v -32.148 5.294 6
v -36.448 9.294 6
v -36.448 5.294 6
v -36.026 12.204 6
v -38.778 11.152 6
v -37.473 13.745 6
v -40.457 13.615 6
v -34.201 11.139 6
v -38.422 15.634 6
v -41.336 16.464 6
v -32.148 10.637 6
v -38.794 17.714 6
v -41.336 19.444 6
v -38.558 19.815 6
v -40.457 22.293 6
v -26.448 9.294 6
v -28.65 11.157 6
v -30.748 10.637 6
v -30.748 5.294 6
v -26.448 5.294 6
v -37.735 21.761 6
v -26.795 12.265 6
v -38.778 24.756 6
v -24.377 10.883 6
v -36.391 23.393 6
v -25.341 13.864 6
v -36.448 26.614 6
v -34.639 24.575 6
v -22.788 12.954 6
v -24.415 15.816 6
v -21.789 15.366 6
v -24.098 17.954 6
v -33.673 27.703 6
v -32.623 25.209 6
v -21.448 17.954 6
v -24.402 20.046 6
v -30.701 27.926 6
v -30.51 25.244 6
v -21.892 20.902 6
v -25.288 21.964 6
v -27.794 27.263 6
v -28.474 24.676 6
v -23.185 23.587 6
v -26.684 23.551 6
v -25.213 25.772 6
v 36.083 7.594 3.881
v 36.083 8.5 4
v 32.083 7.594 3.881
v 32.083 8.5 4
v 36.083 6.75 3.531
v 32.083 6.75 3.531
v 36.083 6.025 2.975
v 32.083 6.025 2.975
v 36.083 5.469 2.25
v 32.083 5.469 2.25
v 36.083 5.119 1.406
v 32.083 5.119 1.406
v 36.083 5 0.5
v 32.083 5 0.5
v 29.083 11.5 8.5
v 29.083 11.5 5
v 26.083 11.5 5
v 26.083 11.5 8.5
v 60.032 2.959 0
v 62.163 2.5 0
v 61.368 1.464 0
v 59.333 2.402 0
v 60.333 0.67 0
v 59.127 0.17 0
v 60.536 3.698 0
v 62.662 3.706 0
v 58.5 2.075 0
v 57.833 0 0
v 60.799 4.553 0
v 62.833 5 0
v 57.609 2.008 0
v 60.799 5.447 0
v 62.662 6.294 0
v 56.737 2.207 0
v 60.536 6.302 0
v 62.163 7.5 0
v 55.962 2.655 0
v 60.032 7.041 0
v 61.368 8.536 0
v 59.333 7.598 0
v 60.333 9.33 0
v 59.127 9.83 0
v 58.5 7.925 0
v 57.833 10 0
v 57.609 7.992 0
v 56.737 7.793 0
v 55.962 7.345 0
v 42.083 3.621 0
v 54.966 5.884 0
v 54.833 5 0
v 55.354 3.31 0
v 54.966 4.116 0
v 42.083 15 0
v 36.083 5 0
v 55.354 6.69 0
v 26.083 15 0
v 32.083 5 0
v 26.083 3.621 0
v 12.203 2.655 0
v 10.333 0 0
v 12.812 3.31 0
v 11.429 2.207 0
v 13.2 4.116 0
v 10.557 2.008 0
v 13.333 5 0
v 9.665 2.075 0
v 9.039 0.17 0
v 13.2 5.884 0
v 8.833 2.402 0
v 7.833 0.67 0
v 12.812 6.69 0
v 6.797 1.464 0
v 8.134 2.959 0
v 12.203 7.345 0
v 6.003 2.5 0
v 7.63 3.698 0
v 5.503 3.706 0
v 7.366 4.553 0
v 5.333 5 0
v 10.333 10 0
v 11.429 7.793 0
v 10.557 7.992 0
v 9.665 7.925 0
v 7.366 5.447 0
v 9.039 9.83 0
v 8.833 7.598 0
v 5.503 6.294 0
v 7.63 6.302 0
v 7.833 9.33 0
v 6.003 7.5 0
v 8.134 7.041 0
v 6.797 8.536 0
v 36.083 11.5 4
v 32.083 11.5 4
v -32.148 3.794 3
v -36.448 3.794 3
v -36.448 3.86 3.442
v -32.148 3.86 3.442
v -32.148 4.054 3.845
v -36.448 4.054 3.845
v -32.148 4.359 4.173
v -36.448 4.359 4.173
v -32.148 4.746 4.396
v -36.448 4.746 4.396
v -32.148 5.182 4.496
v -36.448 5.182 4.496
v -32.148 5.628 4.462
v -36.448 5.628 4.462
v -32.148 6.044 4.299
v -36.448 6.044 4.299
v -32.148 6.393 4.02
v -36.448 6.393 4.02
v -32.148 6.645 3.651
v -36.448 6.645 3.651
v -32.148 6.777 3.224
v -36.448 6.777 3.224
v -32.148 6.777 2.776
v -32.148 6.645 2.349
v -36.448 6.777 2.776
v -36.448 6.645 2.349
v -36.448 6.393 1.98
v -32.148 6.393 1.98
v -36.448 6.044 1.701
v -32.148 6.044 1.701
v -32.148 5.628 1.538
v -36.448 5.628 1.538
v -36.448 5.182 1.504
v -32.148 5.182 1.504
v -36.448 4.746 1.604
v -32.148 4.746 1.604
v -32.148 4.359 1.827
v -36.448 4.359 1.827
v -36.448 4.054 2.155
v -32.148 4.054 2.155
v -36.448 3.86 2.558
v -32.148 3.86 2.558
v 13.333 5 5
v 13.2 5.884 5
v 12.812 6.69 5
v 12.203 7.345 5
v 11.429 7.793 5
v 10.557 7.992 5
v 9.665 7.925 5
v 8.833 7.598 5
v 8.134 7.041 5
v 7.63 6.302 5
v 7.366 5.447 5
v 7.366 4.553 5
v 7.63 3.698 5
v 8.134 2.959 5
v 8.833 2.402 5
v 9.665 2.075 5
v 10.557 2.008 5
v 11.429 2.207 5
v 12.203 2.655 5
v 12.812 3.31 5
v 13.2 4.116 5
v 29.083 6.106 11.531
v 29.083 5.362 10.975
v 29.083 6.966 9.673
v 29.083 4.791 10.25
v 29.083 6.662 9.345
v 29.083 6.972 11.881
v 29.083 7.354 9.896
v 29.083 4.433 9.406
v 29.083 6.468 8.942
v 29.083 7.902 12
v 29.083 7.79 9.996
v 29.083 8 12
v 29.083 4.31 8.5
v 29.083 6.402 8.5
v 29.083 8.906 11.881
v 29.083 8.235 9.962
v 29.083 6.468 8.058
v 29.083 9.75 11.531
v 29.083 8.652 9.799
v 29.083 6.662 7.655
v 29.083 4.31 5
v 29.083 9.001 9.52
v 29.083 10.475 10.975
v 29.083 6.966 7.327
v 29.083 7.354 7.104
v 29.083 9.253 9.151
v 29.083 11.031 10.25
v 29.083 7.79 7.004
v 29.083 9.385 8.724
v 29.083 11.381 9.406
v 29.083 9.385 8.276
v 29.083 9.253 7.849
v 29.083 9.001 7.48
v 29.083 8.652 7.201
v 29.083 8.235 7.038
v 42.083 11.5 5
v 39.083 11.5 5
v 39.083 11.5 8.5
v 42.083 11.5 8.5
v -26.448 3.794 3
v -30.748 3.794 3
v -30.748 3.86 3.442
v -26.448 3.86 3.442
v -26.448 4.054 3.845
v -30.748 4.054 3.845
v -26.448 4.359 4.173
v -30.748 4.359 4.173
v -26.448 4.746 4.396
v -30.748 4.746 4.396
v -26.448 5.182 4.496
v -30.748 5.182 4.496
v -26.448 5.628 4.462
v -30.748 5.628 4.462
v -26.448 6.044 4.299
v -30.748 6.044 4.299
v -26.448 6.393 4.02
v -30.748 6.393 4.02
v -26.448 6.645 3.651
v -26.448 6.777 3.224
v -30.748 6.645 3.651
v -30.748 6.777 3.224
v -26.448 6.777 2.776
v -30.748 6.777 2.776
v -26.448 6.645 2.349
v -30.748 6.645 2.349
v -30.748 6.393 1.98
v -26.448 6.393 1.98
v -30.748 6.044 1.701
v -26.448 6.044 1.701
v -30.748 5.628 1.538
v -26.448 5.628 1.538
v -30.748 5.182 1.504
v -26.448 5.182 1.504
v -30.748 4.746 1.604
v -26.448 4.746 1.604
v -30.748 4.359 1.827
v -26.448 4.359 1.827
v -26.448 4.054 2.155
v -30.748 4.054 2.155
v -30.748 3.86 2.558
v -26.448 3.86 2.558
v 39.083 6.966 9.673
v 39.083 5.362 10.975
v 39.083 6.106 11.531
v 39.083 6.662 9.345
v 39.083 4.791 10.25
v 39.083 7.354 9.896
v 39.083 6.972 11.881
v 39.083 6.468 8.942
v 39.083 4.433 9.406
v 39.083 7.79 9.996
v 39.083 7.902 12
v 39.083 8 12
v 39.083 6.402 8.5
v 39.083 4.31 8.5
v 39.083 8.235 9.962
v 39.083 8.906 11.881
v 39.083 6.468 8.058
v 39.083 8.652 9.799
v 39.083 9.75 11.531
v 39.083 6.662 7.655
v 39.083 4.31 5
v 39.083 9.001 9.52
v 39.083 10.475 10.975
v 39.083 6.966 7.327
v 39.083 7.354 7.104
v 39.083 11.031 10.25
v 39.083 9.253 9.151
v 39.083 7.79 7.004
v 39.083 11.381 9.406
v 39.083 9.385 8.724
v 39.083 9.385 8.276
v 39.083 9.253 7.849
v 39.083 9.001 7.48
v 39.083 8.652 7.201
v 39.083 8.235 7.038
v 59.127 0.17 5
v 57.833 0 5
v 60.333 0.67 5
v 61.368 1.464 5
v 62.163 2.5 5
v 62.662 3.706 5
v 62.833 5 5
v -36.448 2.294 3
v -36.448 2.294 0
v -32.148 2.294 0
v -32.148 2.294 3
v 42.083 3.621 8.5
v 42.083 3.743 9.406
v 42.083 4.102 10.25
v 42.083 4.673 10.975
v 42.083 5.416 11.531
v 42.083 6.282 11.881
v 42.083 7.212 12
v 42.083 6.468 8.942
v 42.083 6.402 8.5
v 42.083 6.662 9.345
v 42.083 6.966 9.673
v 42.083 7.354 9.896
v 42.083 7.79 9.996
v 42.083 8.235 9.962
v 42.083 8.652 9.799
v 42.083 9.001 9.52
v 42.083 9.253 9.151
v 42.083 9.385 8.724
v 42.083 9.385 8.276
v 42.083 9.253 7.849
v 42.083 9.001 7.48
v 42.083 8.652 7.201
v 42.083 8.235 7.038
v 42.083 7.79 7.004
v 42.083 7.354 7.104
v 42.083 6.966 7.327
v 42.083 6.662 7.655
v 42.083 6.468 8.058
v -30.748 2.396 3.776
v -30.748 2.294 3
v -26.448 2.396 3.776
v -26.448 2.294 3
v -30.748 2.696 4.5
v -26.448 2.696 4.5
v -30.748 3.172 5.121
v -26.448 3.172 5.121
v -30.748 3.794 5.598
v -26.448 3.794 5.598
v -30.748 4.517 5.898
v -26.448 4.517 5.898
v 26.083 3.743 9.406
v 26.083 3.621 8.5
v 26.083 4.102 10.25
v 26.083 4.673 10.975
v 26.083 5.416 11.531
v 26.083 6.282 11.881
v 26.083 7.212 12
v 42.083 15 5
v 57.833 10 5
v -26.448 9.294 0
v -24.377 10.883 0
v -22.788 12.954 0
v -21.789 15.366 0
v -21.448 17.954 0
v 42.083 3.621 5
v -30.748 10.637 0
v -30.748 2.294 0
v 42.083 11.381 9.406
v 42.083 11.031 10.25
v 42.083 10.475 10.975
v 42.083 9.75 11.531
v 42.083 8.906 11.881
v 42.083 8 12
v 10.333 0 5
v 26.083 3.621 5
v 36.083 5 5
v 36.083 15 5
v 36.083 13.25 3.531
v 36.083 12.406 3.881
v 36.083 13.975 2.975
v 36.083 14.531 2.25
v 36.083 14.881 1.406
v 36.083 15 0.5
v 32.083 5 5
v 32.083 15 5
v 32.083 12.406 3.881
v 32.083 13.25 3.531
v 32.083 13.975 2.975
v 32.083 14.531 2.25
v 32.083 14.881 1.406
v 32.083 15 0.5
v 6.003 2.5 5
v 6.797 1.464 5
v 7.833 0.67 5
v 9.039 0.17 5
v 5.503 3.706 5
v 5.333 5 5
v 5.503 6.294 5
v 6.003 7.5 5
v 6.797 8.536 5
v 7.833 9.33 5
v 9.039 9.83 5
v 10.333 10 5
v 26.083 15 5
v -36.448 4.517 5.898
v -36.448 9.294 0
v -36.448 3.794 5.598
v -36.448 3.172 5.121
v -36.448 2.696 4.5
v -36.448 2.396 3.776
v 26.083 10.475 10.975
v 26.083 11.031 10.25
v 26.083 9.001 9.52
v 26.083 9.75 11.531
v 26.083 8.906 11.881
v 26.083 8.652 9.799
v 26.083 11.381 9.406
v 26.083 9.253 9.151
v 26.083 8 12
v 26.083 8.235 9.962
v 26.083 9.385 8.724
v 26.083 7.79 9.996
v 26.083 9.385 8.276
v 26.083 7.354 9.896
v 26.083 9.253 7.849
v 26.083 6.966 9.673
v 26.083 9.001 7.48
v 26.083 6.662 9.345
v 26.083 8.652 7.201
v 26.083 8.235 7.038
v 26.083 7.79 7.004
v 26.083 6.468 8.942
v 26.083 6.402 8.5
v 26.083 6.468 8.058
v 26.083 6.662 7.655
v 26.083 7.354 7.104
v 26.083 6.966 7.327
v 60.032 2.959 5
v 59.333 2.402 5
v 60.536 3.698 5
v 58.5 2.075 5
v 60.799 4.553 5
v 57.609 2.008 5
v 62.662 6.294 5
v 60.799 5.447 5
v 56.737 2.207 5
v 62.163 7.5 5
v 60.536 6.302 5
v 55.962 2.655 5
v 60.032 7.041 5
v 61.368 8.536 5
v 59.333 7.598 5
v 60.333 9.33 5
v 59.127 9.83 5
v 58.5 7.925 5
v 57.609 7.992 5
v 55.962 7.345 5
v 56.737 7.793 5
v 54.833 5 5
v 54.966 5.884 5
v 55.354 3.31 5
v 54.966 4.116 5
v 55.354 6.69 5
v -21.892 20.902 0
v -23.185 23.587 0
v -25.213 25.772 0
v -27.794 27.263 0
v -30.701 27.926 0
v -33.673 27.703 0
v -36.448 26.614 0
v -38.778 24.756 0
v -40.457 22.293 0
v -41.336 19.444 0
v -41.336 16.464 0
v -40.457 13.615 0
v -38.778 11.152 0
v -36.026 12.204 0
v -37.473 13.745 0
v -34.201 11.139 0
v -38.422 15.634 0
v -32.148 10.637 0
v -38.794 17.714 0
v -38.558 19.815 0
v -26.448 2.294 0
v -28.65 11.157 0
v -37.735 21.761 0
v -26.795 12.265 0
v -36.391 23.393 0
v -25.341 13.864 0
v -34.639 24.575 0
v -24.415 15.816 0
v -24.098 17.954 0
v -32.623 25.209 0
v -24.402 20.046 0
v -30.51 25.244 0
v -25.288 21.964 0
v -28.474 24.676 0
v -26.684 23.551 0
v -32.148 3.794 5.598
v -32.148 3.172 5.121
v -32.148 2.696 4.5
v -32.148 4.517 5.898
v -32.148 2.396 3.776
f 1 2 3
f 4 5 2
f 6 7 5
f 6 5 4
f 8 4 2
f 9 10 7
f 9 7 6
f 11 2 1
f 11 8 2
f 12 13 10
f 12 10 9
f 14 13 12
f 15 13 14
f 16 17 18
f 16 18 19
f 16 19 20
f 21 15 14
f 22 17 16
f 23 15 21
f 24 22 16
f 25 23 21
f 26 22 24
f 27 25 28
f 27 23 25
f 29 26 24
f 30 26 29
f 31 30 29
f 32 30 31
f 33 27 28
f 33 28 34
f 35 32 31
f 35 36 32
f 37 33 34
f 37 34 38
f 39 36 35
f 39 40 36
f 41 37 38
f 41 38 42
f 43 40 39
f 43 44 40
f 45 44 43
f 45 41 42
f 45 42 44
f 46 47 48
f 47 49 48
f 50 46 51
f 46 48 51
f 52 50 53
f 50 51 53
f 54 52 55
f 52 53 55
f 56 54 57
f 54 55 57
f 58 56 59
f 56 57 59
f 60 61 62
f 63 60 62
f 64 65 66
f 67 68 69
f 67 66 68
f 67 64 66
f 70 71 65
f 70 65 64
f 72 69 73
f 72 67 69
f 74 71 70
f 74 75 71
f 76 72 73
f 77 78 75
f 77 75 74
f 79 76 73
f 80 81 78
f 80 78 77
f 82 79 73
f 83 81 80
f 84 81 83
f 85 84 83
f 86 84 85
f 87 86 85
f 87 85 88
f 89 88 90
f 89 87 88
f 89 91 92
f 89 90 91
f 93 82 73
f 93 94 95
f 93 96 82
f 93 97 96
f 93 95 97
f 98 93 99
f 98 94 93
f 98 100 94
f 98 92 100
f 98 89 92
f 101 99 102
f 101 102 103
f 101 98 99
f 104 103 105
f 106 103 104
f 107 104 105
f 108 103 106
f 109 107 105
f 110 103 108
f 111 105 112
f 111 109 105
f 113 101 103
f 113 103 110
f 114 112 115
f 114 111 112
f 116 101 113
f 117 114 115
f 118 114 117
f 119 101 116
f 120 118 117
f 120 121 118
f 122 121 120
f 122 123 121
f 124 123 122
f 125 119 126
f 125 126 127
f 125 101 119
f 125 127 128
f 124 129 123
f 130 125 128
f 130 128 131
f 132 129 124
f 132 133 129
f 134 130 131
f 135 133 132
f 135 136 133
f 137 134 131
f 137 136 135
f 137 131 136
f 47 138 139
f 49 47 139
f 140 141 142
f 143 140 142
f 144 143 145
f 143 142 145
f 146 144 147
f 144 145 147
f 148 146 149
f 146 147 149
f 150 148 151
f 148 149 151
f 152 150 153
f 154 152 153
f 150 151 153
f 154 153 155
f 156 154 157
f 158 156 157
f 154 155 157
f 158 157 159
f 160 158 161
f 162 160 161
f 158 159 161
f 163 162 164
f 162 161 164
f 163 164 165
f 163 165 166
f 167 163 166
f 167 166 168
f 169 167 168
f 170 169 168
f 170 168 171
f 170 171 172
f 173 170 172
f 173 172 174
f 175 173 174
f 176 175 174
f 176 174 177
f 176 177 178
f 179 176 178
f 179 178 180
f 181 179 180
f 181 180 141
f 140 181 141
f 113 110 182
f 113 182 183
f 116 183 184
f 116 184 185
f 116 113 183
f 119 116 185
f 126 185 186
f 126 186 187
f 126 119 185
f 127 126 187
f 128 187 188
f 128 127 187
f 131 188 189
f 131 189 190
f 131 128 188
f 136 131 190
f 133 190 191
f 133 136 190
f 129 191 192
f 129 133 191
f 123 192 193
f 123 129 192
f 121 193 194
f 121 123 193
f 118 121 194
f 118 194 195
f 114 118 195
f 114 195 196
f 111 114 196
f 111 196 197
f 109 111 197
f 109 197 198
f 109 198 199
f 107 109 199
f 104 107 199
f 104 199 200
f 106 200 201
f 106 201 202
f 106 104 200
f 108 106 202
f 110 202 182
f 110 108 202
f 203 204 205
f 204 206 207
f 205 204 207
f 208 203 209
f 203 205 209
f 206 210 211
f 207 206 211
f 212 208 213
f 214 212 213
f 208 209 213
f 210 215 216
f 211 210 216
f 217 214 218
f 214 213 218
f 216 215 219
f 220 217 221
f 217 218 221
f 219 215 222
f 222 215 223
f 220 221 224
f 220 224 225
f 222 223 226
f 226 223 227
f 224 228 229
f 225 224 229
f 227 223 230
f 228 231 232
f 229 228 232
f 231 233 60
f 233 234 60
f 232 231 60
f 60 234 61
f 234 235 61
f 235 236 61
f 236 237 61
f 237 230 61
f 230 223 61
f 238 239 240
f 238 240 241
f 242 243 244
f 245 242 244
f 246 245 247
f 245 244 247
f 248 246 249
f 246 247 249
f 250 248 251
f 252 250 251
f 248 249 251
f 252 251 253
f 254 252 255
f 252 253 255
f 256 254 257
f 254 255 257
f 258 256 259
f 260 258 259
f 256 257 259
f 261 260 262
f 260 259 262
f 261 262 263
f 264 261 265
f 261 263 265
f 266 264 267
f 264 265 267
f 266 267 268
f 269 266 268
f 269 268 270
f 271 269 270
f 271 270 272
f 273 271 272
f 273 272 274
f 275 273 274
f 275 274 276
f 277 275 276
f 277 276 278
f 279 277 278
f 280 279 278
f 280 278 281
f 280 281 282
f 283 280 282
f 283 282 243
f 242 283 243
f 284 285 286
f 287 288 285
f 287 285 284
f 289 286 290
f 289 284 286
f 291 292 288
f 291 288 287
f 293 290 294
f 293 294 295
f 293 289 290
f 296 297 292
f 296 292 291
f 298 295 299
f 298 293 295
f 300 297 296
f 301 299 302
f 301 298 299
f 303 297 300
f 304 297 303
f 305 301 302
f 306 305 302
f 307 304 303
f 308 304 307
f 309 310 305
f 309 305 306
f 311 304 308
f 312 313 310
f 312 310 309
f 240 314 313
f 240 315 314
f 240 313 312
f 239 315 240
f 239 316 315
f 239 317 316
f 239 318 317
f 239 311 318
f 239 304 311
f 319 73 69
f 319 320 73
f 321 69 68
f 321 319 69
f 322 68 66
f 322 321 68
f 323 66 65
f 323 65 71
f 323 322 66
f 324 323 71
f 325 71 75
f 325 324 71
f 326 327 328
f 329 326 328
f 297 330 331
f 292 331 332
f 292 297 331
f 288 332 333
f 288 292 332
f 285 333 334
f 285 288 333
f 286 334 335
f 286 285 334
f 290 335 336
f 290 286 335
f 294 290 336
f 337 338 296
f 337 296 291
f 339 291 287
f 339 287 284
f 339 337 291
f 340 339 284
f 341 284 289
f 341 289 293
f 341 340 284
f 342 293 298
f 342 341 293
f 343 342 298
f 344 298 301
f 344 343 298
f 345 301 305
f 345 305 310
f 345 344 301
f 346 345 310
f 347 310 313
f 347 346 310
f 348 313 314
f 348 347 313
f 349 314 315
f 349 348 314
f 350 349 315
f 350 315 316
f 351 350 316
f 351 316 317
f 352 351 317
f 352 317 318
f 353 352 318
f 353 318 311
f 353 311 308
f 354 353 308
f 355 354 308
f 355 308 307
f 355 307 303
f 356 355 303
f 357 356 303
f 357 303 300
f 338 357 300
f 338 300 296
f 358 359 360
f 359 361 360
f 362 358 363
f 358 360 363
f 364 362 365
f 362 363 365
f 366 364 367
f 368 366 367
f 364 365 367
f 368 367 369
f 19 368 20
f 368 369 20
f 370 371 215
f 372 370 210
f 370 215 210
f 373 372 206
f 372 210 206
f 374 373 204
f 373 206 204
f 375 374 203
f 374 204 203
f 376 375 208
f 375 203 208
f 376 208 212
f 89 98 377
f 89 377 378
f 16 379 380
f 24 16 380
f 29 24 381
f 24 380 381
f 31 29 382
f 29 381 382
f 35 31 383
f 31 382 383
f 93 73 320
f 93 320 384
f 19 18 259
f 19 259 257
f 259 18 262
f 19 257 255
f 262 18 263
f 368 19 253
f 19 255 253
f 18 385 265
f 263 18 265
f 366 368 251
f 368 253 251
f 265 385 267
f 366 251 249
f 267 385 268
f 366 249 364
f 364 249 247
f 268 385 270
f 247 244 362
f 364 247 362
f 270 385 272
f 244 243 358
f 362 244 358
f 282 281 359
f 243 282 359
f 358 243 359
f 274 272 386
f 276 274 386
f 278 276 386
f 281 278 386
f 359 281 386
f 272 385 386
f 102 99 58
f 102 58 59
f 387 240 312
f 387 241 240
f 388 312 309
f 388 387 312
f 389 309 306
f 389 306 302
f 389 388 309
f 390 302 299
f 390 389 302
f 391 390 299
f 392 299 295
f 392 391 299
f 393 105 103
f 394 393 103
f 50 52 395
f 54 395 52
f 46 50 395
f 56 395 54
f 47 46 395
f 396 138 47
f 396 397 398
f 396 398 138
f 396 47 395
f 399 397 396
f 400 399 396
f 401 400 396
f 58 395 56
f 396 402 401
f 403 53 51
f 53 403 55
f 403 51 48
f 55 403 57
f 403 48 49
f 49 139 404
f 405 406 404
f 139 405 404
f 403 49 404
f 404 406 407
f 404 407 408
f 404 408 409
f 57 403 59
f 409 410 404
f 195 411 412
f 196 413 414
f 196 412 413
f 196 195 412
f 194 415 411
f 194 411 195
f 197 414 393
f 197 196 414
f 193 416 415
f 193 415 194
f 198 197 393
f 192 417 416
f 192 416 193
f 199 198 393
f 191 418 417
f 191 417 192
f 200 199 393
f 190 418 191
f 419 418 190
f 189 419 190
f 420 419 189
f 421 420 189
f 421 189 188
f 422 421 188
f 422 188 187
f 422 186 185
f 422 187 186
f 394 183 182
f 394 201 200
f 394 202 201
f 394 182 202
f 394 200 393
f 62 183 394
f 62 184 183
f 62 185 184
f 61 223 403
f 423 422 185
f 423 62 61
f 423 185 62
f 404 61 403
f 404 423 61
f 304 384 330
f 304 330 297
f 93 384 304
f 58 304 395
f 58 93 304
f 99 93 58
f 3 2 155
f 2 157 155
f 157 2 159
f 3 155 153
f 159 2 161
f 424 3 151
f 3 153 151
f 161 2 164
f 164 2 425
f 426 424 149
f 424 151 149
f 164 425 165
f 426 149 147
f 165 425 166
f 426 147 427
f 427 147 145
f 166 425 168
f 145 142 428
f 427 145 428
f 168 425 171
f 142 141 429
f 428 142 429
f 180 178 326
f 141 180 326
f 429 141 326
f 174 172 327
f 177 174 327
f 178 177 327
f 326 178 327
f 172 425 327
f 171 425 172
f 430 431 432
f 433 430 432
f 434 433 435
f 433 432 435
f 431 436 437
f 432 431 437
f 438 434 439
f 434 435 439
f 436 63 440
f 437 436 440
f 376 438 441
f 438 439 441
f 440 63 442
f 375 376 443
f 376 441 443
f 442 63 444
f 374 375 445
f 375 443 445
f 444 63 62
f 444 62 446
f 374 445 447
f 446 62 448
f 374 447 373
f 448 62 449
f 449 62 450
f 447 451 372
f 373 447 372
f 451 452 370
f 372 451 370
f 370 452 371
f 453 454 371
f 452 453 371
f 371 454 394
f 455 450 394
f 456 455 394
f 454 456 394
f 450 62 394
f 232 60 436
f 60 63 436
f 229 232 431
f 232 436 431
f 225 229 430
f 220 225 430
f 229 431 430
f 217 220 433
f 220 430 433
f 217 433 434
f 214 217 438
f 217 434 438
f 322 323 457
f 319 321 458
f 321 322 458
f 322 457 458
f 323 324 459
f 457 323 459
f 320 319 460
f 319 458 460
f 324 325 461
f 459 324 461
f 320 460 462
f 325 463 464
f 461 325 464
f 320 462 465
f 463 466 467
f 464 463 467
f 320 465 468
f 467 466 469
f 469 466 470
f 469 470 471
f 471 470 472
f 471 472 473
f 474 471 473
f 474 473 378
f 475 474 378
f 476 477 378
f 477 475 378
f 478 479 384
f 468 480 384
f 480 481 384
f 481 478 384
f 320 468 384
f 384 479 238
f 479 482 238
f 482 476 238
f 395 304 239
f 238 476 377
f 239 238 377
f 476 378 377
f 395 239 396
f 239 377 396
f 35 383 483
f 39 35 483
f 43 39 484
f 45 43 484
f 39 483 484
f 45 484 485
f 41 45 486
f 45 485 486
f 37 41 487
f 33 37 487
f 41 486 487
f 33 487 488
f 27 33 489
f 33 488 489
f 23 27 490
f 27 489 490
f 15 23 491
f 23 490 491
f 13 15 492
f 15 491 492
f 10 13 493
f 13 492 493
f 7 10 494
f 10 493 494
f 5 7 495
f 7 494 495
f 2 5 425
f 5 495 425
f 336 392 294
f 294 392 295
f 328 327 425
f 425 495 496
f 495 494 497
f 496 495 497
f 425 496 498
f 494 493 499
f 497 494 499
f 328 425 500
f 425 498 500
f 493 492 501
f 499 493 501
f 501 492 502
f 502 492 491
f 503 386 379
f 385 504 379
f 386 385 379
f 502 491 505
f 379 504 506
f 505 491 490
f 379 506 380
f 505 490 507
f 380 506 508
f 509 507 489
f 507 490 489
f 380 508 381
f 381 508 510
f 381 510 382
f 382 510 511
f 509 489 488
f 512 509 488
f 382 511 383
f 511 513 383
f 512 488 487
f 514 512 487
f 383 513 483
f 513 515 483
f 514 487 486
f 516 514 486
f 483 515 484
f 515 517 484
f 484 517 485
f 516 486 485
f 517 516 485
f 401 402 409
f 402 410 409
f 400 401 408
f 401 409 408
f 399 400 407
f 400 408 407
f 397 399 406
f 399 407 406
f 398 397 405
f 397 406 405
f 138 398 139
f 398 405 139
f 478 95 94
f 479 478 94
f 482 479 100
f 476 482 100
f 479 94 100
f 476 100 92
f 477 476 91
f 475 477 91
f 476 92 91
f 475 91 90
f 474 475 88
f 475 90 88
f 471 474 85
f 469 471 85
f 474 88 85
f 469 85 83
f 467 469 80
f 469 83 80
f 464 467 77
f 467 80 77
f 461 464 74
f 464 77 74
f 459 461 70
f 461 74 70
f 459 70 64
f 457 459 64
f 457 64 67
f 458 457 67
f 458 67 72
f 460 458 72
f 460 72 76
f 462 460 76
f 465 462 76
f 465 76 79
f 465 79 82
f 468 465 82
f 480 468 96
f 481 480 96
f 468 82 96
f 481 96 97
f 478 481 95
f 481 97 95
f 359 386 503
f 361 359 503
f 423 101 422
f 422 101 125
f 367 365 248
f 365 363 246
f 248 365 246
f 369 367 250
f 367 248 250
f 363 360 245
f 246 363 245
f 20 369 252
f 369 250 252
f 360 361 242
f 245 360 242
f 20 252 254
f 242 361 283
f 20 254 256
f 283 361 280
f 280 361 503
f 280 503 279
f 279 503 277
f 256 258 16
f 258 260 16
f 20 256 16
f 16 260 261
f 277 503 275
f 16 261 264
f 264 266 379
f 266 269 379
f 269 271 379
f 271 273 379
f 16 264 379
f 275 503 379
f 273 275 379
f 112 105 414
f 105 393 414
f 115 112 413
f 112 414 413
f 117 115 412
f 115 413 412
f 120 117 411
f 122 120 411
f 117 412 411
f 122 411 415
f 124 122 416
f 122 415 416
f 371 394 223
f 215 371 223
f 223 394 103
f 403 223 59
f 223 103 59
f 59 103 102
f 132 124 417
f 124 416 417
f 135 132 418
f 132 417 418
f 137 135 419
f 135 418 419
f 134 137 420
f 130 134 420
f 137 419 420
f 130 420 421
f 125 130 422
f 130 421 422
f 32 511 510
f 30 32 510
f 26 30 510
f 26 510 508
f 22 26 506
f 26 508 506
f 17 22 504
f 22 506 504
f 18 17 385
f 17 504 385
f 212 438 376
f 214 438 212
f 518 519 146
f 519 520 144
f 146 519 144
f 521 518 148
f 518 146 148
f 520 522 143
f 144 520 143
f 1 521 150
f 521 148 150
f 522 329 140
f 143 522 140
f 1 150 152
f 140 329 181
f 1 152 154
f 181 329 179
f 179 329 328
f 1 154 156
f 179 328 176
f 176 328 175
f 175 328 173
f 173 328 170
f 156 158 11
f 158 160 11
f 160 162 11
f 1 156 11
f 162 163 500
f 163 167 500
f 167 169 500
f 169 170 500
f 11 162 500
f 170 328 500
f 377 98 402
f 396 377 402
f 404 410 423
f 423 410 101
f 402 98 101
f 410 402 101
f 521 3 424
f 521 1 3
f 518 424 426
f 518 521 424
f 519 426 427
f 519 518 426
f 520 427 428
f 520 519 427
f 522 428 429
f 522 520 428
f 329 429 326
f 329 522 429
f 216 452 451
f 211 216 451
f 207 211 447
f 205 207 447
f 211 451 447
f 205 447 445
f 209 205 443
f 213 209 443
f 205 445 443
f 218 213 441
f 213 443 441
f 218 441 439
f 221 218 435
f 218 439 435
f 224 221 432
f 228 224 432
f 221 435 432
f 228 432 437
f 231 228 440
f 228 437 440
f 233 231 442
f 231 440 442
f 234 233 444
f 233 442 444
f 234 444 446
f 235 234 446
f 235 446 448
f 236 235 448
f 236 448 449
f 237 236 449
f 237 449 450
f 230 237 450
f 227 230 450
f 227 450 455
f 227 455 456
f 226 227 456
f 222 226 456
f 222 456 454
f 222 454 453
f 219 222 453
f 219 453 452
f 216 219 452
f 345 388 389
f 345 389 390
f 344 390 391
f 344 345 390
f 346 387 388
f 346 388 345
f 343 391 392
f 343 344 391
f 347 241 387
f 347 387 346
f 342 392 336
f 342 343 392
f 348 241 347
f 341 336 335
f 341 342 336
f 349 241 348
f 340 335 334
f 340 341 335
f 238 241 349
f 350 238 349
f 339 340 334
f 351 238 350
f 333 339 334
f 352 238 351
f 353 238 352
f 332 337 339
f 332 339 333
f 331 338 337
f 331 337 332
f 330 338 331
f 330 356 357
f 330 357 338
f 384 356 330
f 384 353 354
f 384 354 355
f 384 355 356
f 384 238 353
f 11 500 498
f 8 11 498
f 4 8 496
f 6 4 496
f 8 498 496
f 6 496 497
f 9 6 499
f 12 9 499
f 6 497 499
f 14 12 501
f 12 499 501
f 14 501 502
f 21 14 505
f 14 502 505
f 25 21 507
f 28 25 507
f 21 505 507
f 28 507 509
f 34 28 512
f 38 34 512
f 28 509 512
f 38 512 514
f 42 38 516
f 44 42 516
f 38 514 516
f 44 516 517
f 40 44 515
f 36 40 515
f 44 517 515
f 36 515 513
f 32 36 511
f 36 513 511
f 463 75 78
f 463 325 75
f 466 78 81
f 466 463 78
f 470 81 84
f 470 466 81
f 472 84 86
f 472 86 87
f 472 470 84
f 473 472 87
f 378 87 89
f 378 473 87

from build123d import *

# Parameters (mm, degrees)
F1_DEPTH = 6
F3_D     = 3
F5_DEPTH = 12
F4_R     = 3
F4_W     = 3
F4_H     = 3.5
F6_DEPTH = 5
F4_W_2   = 2
F4_H_2   = 10
F7_DEPTH = 4
F8_R     = 4.99999
F9_R     = 3.5
F11_D    = 3
F13_R    = 3


# Not quite as in the source:
# - a fillet or chamfer is up to 0.001 mm smaller than in the source, because OpenCascade refuses the exact size
# - a feature names something its author has since deleted; it is built from what else it names


with BuildPart() as f1:
    # F0 (on Top) → F1 (new body)
    with BuildSketch(Plane.XY):
        with BuildLine():
            ThreePointArc((-26.4478022211, 9.2937625569), (-28.5229179157, 8.3913259797), (-30.7478022211, 7.978546681))
            Line((-30.7478022211, 7.978546681), (-30.7478022211, 2.2937625569))
            Line((-30.7478022211, 2.2937625569), (-26.4478022211, 2.2937625569))
            Line((-26.4478022211, 2.2937625569), (-26.4478022211, 9.2937625569))
        make_face()
        with BuildLine():
            Line((-32.1478022211, 2.2937625569), (-32.1478022211, 7.978546681))
            ThreePointArc((-32.1478022211, 7.978546681), (-34.3726865265, 8.3913259797), (-36.4478022211, 9.2937625569))
            Line((-36.4478022211, 9.2937625569), (-36.4478022211, 2.2937625569))
            Line((-36.4478022211, 2.2937625569), (-32.1478022211, 2.2937625569))
        make_face()
        with BuildLine():
            ThreePointArc((-32.1478022211, 10.6374258586), (-36.3913586332, 23.3931111885), (-24.0978022211, 17.9540165948))
            ThreePointArc((-24.0978022211, 17.9540165948), (-26.0087076273, 13.0104601826), (-30.7478022211, 10.6374258586))
            Line((-30.7478022211, 10.6374258586), (-30.7478022211, 7.978546681))
            ThreePointArc((-30.7478022211, 7.978546681), (-28.5229179157, 8.3913259797), (-26.4478022211, 9.2937625569))
            ThreePointArc((-26.4478022211, 9.2937625569), (-22.7875481833, 12.9540165948), (-21.4478022211, 17.9540165948))
            ThreePointArc((-21.4478022211, 17.9540165948), (-36.4478022211, 26.6142706326), (-36.4478022211, 9.2937625569))
            ThreePointArc((-36.4478022211, 9.2937625569), (-34.3726865265, 8.3913259797), (-32.1478022211, 7.978546681))
            Line((-32.1478022211, 7.978546681), (-32.1478022211, 10.6374258586))
        make_face()
    extrude(amount=F1_DEPTH)

    # F3 (through all)
    with Locations(Plane.YZ.offset(-26.4478022211)):
        with Locations((5.2937625569, 3)):
            Hole(F3_D / 2)

    # F13
    f13_edges = [f1.edges().sort_by_distance(p)[0] for p in [
        (-34.297802, 2.293763, 6),
        (-28.597802, 2.293763, 6),
    ]]
    fillet(f13_edges, radius=F13_R)


with BuildPart() as f5:
    # F4 (on Top) → F5 (new body)
    with BuildSketch(Plane.XY):
        Polygon((26.0828619152, 5), (26.0828619152, 3.6206896552), (29.0828619152, 4.3103448276), (29.0828619152, 5), (29.0828619152, 11.5), (26.0828619152, 11.5), align=None)
    extrude(amount=F5_DEPTH)

    # F4 (on Top) → F6 (join)
    with BuildSketch(Plane.XY):
        Polygon((10.3328619152, 10), (5.3328619152, 10), (5.3328619152, 0), (10.3328619152, 0), (26.0828619152, 3.6206896552), (26.0828619152, 5), (26.0828619152, 11.5), (26.0828619152, 15), align=None)
        with Locations((10.3328619152, 5)):
            Circle(F4_R, mode=Mode.SUBTRACT)
        Polygon((32.0828619152, 15), (29.0828619152, 15), (29.0828619152, 11.5), (29.0828619152, 5), (29.0828619152, 4.3103448276), (32.0828619152, 5), align=None)
        with Locations((27.5828619152, 13.25)):
            Rectangle(F4_W, F4_H)
    extrude(amount=F6_DEPTH)

    # F4 (on Top) → F7 (join)
    with BuildSketch(Plane.XY):
        with Locations((33.0828619152, 10)):
            Rectangle(F4_W_2, F4_H_2)
    extrude(amount=F7_DEPTH)

    # F8 (radius 5 in the source; OpenCascade refuses exactly that, so slightly less here)
    f8_edges = [f5.edges().sort_by_distance(p)[0] for p in [
        (5.332862, 0, 2.5),
        (5.332862, 10, 2.5),
    ]]
    fillet(f8_edges, radius=F8_R)

    # F9
    f9_edges = [f5.edges().sort_by_distance(p)[0] for p in [
        (33.082862, 15, 4),
        (33.082862, 5, 4),
        (27.582862, 11.5, 12),
        (27.582862, 3.965517, 12),
    ]]
    fillet(f9_edges, radius=F9_R)

    # F11 (through all)
    with Locations(Plane.YZ.offset(29.0828619152)):
        with Locations((7.9016367206, 8.5)):
            Hole(F11_D / 2)

    # F12: F5 across face


with BuildPart() as f5_1:
    add(f5.part)
    add(f5.part.mirror(Plane(origin=(34.0828619152, 10, 1.8156409487), x_dir=(0, 1, 0), z_dir=(1, 0, 0))))


solid = Compound([f1.part, f5_1.part])
